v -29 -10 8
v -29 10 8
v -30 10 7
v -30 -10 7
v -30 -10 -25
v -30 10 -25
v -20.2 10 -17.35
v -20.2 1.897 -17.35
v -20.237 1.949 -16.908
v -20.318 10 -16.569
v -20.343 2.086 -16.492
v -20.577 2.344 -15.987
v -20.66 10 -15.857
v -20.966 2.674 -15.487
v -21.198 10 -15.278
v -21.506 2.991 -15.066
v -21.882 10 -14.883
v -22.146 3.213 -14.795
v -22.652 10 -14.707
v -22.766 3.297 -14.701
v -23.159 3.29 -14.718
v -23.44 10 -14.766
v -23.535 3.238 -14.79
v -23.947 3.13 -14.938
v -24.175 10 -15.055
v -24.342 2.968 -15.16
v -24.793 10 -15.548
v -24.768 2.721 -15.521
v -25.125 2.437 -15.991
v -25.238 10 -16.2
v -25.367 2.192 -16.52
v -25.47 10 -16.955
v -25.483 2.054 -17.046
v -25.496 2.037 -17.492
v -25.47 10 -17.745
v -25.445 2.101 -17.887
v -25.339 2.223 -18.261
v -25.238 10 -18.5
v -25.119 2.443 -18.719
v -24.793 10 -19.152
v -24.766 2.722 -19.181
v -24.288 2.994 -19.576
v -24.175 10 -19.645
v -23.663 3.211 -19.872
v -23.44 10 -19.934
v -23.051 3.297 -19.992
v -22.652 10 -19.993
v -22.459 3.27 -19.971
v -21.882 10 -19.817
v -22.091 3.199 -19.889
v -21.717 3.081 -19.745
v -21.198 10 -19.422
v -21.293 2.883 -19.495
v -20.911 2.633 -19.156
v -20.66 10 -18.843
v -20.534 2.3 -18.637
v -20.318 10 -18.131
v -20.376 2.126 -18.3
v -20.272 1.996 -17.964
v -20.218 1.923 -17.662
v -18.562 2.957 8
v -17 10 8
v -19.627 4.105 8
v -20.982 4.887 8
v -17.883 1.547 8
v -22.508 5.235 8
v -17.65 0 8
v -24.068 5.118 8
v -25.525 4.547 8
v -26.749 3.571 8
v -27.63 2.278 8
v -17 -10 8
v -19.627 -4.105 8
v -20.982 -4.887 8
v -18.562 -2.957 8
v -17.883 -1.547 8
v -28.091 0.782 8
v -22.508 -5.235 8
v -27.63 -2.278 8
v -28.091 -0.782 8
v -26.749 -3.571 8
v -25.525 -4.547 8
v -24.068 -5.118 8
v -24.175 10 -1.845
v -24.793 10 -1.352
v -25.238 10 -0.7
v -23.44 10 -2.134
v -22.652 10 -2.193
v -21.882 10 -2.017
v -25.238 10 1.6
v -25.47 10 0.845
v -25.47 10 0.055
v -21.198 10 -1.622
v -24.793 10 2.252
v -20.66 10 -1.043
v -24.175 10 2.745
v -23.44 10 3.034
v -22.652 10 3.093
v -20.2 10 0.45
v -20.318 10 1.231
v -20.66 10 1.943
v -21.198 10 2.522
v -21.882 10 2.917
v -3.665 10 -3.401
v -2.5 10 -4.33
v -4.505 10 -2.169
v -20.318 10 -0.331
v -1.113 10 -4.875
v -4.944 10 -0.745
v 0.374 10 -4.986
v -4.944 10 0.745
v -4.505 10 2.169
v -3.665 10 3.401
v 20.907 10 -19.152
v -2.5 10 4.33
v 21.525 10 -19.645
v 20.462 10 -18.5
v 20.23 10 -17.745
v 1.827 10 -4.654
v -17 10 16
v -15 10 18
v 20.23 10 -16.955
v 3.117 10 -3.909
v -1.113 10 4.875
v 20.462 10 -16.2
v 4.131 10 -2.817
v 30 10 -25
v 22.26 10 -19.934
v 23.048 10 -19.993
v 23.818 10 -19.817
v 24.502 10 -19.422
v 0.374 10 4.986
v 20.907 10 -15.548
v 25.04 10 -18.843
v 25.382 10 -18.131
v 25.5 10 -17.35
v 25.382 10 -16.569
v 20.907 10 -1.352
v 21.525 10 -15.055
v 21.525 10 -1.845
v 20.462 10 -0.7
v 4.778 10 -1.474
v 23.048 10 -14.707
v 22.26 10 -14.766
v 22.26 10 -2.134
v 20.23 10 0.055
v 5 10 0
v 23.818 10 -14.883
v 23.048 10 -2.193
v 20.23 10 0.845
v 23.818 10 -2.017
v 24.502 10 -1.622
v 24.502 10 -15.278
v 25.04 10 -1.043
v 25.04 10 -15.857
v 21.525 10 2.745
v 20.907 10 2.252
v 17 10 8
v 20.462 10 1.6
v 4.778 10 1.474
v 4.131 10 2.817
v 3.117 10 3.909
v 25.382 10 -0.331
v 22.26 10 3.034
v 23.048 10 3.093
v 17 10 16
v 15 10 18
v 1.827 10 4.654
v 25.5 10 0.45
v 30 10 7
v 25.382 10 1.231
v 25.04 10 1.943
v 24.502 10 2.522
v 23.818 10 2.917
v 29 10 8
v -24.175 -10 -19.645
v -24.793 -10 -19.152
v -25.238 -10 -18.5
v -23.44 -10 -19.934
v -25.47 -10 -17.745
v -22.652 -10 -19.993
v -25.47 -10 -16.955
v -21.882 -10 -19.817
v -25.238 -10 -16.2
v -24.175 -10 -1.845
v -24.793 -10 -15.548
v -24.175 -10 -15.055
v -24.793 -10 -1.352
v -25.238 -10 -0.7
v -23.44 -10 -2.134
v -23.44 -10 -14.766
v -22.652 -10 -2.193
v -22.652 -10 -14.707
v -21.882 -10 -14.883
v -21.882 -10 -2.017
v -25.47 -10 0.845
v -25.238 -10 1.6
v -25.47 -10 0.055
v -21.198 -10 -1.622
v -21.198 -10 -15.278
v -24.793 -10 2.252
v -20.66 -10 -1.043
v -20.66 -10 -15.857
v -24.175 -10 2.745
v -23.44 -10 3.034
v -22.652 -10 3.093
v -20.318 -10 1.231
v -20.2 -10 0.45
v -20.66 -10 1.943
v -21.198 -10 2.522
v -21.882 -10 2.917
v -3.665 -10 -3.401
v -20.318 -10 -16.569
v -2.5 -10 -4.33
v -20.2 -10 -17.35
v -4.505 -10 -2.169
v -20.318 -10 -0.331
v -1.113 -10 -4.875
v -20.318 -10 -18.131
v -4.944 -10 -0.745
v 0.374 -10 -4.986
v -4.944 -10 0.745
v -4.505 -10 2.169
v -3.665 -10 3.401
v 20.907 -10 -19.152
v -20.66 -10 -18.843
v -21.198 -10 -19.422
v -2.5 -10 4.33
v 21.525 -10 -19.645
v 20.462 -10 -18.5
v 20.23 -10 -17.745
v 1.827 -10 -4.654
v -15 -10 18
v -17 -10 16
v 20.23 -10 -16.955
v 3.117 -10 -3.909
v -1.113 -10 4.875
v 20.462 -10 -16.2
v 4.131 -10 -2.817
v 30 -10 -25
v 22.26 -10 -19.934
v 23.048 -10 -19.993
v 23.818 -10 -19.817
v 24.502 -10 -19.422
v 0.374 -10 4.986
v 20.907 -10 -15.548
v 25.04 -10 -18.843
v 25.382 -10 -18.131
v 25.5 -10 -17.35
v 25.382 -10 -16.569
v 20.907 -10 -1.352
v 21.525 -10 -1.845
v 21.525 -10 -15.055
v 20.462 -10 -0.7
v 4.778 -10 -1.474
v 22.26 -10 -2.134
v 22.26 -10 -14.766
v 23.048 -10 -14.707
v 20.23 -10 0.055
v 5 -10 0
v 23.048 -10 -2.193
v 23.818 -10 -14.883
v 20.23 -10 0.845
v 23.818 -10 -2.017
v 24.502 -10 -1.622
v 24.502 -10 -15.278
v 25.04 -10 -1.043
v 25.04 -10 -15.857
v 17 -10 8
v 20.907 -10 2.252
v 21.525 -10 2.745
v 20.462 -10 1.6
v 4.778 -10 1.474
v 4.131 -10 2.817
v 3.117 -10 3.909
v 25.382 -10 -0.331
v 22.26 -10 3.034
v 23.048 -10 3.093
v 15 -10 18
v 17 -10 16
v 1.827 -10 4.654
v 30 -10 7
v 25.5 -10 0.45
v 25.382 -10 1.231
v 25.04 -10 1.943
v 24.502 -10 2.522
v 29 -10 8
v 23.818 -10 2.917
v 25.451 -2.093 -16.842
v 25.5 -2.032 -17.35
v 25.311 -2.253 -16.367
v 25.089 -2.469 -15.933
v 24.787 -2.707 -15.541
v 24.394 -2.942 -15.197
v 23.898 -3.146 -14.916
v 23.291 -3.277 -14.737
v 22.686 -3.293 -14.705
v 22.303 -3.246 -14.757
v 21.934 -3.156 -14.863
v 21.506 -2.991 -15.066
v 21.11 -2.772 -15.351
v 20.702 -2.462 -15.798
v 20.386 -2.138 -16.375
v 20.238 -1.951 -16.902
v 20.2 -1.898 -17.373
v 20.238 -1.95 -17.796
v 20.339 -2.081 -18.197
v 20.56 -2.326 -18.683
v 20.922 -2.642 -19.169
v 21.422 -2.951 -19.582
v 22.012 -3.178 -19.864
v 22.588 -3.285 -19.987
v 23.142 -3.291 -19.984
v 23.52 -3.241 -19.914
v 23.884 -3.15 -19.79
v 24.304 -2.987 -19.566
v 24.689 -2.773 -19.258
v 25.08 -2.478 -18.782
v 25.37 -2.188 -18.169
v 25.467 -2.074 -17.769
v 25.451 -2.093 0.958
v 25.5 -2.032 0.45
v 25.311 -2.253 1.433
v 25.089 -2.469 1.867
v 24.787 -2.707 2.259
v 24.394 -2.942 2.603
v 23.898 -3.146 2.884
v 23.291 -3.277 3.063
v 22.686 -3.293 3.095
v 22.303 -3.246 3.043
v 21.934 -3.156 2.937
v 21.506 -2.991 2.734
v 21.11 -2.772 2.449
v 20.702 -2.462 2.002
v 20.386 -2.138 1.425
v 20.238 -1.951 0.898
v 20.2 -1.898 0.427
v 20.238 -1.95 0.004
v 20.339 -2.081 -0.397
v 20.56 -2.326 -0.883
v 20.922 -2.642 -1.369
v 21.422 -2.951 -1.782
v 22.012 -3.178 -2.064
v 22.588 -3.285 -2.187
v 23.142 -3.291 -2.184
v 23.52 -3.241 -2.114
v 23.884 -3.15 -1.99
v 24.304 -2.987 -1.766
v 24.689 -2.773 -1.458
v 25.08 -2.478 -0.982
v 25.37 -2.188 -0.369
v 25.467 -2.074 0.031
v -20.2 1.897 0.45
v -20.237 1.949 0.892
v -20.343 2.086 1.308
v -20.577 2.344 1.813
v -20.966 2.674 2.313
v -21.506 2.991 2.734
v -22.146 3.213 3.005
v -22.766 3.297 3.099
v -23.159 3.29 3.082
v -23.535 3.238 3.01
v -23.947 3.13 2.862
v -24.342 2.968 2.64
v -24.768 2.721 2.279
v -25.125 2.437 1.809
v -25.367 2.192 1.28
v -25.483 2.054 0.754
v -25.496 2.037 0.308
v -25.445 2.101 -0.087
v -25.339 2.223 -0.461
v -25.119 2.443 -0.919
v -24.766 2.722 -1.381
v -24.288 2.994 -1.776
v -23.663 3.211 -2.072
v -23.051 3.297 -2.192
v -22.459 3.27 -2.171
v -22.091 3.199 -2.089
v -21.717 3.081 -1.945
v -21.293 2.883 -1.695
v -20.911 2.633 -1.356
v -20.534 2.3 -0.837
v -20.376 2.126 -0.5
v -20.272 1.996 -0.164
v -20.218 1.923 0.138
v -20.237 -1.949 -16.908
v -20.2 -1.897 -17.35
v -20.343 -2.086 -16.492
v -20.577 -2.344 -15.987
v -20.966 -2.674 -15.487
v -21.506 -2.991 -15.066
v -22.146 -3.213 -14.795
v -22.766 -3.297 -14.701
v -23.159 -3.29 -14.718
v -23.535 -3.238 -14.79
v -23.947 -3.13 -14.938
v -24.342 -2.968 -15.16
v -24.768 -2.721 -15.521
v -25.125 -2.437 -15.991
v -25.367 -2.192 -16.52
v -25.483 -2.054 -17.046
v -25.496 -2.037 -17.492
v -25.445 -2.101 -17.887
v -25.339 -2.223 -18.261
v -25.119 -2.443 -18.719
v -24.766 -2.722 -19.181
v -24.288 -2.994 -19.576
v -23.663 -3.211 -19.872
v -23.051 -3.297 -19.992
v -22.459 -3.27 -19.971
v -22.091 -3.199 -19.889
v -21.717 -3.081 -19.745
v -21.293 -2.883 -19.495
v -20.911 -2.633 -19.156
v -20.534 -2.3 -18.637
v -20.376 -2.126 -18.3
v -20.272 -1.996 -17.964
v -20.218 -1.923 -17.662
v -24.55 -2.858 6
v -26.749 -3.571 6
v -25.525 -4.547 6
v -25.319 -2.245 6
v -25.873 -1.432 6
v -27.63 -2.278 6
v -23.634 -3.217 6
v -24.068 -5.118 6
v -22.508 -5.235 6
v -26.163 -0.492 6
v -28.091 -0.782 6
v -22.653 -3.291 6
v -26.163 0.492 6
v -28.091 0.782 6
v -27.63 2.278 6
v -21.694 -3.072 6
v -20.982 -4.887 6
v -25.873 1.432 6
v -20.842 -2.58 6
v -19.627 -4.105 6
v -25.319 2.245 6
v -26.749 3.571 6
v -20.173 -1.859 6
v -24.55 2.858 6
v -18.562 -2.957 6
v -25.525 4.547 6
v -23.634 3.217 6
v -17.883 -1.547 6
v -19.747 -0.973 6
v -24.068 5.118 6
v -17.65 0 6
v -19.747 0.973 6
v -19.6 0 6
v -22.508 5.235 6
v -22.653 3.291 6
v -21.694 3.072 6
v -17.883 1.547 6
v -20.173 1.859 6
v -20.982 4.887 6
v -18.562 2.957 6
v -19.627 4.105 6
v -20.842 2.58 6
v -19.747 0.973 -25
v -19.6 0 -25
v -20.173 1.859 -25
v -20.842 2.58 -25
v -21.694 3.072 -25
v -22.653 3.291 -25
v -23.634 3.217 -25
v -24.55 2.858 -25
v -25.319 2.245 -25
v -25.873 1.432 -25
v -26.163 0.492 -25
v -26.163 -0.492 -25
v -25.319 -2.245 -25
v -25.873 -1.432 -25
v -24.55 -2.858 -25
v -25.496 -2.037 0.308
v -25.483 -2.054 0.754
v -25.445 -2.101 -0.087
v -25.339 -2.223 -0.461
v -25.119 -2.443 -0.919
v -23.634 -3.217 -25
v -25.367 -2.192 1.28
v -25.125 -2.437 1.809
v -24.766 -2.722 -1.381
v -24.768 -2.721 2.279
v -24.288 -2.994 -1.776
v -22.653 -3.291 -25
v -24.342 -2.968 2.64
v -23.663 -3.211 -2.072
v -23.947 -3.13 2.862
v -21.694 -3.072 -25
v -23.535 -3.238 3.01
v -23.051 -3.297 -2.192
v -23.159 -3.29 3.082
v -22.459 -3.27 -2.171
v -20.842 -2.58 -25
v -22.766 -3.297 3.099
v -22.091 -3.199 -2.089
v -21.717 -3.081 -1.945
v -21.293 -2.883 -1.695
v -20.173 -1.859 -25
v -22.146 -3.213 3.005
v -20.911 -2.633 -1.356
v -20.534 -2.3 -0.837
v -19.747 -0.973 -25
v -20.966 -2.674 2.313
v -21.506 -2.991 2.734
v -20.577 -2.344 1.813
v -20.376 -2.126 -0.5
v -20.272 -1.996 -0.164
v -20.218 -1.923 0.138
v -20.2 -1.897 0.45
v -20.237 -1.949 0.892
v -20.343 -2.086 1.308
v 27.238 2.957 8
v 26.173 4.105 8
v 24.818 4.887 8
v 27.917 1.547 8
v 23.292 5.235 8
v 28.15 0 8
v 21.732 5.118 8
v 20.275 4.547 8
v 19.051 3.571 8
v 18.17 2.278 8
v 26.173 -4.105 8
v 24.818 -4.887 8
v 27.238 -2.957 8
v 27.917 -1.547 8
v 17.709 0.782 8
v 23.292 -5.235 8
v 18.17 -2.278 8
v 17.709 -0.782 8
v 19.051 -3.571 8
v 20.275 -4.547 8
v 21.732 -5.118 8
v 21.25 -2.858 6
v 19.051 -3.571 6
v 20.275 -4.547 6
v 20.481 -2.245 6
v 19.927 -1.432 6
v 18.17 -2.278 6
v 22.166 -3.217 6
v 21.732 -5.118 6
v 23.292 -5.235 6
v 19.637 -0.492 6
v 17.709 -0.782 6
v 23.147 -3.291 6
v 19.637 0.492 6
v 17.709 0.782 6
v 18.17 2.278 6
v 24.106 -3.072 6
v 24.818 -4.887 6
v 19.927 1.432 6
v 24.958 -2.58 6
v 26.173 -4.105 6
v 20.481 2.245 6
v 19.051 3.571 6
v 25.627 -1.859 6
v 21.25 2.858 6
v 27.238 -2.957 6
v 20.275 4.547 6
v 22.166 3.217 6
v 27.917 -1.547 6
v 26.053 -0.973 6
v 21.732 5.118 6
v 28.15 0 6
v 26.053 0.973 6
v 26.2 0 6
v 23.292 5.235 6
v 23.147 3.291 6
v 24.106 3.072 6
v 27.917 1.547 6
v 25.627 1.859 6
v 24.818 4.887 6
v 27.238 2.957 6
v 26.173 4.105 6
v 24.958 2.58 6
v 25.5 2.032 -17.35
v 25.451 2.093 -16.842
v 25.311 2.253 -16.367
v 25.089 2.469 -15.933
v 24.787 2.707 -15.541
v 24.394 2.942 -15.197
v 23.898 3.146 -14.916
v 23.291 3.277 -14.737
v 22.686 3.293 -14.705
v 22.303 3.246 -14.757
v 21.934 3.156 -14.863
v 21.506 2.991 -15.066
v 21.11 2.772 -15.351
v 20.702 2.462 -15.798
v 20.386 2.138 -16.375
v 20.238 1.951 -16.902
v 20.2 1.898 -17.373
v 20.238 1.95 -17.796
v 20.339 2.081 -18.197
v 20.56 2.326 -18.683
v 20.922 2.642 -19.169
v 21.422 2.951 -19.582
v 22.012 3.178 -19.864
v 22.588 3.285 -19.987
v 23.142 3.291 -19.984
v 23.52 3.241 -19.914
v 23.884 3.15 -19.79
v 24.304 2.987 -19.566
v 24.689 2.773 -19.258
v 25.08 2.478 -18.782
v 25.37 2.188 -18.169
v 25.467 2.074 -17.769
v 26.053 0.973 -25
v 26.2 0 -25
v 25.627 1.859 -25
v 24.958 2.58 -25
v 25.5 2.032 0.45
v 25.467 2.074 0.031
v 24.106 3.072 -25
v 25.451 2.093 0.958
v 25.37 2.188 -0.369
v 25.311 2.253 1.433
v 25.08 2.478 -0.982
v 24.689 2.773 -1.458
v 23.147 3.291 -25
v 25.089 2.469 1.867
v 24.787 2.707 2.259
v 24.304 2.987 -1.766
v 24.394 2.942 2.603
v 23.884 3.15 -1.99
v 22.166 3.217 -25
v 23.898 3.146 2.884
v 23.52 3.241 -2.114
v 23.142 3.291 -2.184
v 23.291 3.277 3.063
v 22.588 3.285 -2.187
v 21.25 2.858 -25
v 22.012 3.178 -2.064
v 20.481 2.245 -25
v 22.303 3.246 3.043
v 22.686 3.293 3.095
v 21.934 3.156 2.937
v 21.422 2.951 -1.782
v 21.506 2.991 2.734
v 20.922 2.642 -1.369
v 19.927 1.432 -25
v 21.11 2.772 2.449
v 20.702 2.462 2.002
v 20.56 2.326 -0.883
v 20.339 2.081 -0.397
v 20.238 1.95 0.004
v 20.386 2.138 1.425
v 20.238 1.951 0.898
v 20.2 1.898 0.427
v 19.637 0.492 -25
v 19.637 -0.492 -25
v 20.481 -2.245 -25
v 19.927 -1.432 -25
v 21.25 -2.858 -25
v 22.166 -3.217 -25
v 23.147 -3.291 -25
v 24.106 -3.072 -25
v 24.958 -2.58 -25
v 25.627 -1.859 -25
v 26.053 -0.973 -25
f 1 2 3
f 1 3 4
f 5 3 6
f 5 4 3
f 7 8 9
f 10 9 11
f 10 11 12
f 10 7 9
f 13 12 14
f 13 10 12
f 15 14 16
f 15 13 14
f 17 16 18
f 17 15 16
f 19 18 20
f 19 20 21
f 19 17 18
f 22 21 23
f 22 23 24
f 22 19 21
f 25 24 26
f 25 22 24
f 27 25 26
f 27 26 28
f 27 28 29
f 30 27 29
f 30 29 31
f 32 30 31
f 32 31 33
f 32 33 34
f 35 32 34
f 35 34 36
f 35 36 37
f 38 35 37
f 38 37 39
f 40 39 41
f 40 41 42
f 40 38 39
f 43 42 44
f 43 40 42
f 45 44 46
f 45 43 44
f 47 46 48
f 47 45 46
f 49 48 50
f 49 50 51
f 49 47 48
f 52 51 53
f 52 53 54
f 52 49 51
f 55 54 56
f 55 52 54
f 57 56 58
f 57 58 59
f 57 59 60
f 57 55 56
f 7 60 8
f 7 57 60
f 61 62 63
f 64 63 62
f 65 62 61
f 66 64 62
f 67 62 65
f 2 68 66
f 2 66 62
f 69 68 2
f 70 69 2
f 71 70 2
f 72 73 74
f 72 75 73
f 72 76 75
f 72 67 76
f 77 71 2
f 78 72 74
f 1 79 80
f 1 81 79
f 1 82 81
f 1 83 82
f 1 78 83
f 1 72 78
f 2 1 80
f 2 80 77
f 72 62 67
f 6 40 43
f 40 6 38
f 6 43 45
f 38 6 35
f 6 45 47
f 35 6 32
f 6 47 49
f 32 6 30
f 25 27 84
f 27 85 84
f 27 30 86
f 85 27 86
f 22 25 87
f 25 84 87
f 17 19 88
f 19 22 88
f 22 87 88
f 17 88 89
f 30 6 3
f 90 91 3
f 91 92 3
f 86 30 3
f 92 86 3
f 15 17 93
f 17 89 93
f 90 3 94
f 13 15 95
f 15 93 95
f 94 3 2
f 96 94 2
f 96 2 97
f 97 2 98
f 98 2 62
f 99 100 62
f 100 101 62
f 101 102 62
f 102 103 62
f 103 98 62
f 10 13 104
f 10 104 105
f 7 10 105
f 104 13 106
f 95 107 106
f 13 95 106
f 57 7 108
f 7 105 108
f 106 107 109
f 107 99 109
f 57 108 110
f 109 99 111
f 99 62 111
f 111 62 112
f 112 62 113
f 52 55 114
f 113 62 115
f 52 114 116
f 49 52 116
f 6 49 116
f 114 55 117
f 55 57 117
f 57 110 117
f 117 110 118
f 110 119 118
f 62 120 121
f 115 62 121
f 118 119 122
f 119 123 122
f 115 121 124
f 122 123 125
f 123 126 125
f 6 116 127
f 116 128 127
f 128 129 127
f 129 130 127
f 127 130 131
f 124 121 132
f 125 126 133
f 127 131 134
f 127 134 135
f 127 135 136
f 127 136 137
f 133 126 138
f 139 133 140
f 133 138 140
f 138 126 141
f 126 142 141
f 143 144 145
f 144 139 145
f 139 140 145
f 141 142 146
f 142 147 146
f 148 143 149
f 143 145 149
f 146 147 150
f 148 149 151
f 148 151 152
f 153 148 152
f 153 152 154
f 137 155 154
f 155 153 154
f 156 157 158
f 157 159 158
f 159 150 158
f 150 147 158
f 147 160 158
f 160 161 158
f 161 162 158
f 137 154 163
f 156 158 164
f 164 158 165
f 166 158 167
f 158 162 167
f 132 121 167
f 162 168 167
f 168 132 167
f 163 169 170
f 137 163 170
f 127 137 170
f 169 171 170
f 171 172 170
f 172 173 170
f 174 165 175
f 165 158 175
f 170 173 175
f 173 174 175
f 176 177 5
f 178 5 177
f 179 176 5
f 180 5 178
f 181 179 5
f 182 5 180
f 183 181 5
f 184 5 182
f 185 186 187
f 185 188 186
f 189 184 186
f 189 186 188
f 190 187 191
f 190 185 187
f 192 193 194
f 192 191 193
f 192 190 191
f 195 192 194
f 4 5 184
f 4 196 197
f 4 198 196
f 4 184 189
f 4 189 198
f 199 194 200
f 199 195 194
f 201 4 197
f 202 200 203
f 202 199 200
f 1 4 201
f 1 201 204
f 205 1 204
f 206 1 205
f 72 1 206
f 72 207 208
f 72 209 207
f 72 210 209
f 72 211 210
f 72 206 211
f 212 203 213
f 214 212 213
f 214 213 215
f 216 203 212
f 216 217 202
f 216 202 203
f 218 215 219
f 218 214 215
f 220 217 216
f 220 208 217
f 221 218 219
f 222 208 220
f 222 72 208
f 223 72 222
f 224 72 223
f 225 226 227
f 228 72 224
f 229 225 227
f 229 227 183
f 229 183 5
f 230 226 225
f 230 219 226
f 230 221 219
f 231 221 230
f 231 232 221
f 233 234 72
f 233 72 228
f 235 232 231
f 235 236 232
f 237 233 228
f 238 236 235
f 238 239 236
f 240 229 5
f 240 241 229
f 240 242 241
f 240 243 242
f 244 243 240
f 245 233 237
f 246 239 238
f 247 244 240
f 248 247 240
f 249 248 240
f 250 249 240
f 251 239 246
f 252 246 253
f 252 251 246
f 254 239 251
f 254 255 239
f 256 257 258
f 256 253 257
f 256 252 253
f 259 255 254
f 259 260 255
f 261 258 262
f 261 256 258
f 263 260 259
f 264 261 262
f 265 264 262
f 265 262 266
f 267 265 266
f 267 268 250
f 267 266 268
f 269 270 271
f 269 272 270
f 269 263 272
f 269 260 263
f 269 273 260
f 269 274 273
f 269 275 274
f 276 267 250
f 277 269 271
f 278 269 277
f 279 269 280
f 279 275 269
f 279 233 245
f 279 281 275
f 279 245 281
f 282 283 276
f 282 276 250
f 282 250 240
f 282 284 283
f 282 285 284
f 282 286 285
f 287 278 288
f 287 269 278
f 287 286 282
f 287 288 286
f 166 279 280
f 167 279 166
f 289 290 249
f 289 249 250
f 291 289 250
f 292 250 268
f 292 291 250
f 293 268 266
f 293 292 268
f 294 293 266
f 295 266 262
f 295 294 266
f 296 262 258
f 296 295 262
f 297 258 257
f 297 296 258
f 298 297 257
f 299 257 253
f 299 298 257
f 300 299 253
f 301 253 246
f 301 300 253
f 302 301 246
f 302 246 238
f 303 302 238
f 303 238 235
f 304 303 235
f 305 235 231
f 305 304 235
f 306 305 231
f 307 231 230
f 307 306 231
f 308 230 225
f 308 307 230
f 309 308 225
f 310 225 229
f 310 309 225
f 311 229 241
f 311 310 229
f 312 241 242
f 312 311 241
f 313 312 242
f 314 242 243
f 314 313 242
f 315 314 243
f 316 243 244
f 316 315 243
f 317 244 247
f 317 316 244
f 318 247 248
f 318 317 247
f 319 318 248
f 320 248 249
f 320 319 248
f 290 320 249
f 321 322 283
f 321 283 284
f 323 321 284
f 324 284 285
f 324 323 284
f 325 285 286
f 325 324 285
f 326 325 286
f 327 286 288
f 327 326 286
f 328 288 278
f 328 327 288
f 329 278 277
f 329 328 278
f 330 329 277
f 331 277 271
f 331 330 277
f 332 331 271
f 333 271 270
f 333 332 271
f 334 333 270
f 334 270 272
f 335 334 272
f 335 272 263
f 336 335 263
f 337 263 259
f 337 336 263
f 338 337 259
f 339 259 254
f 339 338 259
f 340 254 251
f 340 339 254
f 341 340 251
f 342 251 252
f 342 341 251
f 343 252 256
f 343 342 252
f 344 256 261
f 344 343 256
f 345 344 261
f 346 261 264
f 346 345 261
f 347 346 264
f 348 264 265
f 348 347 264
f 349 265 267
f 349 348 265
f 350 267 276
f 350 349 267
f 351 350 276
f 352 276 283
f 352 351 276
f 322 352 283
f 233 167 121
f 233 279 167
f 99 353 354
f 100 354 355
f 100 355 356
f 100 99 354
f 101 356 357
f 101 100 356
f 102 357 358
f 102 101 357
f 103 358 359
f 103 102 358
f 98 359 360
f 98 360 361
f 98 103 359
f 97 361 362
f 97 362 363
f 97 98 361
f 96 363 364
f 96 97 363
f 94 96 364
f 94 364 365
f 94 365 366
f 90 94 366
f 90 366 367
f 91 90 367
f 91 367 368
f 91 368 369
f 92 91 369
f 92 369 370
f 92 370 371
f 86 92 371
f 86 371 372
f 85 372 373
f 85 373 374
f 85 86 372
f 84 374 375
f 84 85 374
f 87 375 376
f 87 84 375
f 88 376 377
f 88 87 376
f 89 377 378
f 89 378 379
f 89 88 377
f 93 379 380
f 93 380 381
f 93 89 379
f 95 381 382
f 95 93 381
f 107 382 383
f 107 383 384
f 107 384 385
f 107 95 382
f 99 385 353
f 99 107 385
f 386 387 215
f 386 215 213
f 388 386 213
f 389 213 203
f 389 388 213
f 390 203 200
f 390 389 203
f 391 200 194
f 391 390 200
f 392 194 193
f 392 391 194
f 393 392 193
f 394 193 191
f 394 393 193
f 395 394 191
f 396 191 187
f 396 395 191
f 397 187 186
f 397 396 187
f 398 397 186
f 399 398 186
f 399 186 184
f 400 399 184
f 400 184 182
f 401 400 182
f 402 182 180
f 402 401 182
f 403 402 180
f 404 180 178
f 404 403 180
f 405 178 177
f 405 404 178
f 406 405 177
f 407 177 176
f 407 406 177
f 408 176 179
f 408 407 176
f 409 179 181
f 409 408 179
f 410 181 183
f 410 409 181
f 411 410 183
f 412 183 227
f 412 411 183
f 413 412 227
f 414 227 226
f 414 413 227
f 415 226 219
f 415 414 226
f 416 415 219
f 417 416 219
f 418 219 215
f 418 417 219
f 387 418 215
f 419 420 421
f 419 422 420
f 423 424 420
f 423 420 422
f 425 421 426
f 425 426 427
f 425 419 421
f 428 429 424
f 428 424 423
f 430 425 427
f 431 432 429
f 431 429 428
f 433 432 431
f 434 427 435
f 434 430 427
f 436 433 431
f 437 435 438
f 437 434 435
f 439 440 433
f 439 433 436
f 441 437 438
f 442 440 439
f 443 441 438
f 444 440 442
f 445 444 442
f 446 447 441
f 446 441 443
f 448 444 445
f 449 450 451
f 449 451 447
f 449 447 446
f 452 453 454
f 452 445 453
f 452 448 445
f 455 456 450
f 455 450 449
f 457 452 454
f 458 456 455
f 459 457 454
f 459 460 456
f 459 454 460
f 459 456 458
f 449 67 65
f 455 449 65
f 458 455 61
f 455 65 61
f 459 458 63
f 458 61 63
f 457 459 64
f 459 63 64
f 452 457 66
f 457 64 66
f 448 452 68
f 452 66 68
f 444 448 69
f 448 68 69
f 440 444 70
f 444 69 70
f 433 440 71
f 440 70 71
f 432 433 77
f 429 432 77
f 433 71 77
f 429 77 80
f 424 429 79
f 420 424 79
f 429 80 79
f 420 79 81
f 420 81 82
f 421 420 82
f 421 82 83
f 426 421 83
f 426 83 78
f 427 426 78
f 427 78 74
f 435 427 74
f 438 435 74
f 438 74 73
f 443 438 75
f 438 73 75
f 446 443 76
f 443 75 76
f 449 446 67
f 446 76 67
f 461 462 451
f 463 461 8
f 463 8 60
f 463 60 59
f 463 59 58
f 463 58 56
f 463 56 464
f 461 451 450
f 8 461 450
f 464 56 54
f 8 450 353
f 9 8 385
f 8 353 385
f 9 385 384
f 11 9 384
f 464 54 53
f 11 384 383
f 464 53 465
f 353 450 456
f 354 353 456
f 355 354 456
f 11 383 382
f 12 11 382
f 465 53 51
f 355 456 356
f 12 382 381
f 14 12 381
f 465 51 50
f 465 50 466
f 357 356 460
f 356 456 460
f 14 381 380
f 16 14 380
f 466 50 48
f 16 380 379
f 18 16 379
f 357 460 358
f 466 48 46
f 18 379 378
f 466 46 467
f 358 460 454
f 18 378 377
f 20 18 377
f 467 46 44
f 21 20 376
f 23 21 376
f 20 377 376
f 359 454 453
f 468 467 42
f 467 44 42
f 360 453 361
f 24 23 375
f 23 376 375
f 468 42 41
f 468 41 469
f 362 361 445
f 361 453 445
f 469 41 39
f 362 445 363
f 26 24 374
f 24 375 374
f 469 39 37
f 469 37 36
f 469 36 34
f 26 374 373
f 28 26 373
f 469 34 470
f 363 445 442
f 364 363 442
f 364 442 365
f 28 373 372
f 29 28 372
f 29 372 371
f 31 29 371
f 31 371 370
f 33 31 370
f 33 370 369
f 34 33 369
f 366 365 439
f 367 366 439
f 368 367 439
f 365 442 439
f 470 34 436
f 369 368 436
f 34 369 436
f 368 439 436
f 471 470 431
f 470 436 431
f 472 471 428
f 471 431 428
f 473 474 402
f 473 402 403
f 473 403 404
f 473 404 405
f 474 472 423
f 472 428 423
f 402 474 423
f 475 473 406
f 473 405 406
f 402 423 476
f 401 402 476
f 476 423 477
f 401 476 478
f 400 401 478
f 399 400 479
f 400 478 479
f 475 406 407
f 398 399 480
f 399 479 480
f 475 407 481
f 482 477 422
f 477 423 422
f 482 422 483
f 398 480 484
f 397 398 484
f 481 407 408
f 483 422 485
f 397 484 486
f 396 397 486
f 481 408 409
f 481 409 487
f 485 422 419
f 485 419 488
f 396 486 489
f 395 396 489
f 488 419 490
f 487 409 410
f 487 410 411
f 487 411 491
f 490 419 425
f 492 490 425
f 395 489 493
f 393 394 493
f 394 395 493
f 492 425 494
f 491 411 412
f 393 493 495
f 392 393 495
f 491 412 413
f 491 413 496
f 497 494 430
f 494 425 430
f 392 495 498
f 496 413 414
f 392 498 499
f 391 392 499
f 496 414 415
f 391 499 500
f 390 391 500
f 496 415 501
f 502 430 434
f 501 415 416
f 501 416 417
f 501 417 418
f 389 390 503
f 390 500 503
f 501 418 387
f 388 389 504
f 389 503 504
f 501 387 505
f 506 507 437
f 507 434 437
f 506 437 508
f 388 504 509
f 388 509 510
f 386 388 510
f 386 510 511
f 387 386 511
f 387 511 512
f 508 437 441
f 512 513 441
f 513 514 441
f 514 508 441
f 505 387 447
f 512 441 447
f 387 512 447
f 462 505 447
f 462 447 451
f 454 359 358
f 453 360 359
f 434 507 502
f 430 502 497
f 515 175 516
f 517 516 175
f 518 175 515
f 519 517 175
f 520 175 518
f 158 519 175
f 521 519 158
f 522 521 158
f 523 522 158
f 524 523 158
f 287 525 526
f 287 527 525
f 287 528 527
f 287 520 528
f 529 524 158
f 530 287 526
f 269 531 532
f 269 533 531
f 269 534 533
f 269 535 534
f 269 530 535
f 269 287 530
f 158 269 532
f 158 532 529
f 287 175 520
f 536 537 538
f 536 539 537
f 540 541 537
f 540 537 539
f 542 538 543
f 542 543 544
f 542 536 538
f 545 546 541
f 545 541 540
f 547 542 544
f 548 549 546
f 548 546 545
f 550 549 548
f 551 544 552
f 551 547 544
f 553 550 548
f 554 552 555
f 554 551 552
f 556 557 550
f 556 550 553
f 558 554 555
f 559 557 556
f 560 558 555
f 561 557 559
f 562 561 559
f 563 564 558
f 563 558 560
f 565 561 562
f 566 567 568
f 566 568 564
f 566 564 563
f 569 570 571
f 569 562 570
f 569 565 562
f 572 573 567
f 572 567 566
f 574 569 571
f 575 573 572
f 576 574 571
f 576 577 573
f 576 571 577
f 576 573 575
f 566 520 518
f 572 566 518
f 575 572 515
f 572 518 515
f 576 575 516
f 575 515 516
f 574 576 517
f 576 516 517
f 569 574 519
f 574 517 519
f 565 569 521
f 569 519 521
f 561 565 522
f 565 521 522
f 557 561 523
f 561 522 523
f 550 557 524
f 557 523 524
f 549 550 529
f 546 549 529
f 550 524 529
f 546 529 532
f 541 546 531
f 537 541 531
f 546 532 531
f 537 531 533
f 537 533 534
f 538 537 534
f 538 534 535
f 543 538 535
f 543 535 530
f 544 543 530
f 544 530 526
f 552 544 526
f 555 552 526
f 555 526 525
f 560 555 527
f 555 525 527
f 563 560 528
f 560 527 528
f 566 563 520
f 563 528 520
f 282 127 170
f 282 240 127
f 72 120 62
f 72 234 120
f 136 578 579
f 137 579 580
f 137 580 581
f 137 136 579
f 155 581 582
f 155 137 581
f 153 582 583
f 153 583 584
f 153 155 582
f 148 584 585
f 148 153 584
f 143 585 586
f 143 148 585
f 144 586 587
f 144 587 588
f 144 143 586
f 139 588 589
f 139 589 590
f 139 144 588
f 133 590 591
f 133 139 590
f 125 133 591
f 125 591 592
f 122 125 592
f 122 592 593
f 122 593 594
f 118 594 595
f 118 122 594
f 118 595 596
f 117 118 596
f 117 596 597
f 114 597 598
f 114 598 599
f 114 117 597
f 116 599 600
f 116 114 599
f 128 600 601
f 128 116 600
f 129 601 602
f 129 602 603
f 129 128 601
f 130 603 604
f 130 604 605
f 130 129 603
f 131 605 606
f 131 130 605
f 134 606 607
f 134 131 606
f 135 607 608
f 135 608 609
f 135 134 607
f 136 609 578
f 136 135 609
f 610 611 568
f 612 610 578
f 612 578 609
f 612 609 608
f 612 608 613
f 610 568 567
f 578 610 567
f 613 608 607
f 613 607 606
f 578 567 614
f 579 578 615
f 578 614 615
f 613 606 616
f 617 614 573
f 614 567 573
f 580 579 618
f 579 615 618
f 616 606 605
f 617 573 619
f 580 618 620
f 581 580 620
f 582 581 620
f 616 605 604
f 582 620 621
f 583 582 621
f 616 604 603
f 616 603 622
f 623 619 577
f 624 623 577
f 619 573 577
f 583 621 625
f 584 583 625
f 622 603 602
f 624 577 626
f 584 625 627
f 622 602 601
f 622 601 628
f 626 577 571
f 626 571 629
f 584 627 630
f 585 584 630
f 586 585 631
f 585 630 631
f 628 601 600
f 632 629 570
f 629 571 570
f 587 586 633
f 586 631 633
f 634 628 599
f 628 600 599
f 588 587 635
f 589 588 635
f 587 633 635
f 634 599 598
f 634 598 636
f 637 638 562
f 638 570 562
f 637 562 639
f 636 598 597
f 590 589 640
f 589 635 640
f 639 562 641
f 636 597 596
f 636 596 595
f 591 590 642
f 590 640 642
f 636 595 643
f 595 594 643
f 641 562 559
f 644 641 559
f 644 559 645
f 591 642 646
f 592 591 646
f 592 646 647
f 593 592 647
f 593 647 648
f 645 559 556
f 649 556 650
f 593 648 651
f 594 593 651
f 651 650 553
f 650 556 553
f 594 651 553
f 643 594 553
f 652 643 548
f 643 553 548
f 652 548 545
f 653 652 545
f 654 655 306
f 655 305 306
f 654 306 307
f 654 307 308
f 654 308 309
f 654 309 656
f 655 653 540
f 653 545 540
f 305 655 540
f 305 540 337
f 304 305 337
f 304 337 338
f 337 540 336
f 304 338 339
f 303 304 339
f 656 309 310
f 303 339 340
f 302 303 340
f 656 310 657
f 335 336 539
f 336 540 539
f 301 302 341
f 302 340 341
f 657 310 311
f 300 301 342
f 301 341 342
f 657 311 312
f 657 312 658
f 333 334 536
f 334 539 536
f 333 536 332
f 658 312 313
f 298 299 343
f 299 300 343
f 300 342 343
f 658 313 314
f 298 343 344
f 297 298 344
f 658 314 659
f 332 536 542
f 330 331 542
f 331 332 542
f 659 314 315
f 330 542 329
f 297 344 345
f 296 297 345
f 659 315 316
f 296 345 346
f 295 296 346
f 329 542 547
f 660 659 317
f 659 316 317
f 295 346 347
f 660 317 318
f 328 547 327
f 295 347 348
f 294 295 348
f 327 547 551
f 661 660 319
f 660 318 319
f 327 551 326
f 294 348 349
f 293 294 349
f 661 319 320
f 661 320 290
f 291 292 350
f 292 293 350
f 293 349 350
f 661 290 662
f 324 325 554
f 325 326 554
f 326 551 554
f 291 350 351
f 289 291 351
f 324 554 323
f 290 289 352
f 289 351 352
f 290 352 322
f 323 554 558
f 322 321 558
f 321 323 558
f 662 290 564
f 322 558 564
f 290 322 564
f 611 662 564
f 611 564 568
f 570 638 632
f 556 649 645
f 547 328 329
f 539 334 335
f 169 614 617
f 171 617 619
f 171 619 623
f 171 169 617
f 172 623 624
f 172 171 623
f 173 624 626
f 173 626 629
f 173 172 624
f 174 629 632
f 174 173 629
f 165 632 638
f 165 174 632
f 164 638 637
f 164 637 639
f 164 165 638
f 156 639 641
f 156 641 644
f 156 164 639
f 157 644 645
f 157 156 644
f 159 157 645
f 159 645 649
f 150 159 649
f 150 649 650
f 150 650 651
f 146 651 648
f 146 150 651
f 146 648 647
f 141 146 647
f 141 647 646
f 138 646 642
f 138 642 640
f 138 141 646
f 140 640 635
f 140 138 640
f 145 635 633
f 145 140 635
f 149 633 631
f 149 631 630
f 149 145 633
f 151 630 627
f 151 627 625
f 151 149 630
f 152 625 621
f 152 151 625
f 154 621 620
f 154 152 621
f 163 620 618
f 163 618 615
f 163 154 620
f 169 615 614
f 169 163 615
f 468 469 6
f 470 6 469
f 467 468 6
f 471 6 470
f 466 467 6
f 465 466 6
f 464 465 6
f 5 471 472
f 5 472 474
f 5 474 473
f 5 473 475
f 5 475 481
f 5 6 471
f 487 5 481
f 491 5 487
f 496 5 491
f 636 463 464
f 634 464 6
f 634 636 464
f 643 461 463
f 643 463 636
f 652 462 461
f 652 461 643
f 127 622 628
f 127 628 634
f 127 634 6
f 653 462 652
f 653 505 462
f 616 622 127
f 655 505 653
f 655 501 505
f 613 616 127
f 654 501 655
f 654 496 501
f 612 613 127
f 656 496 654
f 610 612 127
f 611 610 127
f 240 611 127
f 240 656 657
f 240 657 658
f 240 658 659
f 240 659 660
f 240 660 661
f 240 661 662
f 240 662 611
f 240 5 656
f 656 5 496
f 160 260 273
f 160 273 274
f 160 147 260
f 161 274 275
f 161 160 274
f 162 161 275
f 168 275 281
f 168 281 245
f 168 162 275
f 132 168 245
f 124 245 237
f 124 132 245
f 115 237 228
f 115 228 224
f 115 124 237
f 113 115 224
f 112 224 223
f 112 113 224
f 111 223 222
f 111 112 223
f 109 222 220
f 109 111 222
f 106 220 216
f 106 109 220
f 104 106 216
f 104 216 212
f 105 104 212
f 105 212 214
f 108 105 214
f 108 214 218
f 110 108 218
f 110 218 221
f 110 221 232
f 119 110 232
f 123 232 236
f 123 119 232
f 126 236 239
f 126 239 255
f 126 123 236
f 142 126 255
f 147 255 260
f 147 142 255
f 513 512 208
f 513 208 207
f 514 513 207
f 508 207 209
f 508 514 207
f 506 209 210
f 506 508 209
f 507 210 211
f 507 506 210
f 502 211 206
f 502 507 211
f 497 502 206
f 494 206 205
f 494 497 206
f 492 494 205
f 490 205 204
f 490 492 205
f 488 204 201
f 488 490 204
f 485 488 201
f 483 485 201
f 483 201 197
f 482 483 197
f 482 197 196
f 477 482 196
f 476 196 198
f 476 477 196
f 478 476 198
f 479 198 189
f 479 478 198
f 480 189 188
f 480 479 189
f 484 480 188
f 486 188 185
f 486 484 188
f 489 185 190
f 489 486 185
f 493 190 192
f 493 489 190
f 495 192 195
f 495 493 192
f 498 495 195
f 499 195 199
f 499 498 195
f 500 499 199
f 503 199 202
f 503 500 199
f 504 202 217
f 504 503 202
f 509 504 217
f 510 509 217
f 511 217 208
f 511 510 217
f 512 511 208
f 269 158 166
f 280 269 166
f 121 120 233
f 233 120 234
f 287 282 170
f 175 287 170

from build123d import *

# Parameters (mm, degrees)
F0_R     = 2.65
F0_R_2   = 5
F1_DEPTH = 10
F2_SIZE  = 1
F3_SIZE  = 2
F4_R     = 3.3
F5_DEPTH = 33
F4_R_2   = 5.25
F6_DEPTH = 2


with BuildPart() as f1:
    # F0 (on Front) → F1 (new body, symmetric)
    with BuildSketch(Plane.XZ):
        Polygon((17, 18), (0, 18), (-17, 18), (-17, 8), (-30, 8), (-30, -25), (0, -25), (30, -25), (30, 8), (17, 8), align=None)
        with Locations((-22.85, -17.35)):
            Circle(F0_R, mode=Mode.SUBTRACT)
        with Locations((22.85, -17.35)):
            Circle(F0_R, mode=Mode.SUBTRACT)
        with Locations((-22.85, 0.45)):
            Circle(F0_R, mode=Mode.SUBTRACT)
        Circle(F0_R_2, mode=Mode.SUBTRACT)
        with Locations((22.85, 0.45)):
            Circle(F0_R, mode=Mode.SUBTRACT)
    extrude(amount=F1_DEPTH, both=True)

    # F2
    f2_edges = [f1.edges().sort_by_distance(p)[0] for p in [
        (30, 0, 8),
        (-30, 0, 8),
    ]]
    chamfer(f2_edges, length=F2_SIZE)

    # F3
    f3_edges = [f1.edges().sort_by_distance(p)[0] for p in [
        (17, 0, 18),
        (-17, 0, 18),
    ]]
    chamfer(f3_edges, length=F3_SIZE)

    # F4 (on face) → F5 (cut, through all)
    with BuildSketch(Plane.XY.offset(8)):
        with Locations((-22.9, 0)):
            Circle(F4_R)
        with Locations((22.9, 0)):
            Circle(F4_R)
    extrude(amount=-F5_DEPTH, mode=Mode.SUBTRACT)

    # F4 (on face) → F6 (cut)
    with BuildSketch(Plane.XY.offset(8)):
        with Locations((22.9, 0)):
            Circle(F4_R_2)
        with Locations((22.9, 0)):
            Circle(F4_R, mode=Mode.SUBTRACT)
        with Locations((-22.9, 0)):
            Circle(F4_R_2)
        with Locations((-22.9, 0)):
            Circle(F4_R, mode=Mode.SUBTRACT)
    extrude(amount=-F6_DEPTH, mode=Mode.SUBTRACT)


solid = f1.part
